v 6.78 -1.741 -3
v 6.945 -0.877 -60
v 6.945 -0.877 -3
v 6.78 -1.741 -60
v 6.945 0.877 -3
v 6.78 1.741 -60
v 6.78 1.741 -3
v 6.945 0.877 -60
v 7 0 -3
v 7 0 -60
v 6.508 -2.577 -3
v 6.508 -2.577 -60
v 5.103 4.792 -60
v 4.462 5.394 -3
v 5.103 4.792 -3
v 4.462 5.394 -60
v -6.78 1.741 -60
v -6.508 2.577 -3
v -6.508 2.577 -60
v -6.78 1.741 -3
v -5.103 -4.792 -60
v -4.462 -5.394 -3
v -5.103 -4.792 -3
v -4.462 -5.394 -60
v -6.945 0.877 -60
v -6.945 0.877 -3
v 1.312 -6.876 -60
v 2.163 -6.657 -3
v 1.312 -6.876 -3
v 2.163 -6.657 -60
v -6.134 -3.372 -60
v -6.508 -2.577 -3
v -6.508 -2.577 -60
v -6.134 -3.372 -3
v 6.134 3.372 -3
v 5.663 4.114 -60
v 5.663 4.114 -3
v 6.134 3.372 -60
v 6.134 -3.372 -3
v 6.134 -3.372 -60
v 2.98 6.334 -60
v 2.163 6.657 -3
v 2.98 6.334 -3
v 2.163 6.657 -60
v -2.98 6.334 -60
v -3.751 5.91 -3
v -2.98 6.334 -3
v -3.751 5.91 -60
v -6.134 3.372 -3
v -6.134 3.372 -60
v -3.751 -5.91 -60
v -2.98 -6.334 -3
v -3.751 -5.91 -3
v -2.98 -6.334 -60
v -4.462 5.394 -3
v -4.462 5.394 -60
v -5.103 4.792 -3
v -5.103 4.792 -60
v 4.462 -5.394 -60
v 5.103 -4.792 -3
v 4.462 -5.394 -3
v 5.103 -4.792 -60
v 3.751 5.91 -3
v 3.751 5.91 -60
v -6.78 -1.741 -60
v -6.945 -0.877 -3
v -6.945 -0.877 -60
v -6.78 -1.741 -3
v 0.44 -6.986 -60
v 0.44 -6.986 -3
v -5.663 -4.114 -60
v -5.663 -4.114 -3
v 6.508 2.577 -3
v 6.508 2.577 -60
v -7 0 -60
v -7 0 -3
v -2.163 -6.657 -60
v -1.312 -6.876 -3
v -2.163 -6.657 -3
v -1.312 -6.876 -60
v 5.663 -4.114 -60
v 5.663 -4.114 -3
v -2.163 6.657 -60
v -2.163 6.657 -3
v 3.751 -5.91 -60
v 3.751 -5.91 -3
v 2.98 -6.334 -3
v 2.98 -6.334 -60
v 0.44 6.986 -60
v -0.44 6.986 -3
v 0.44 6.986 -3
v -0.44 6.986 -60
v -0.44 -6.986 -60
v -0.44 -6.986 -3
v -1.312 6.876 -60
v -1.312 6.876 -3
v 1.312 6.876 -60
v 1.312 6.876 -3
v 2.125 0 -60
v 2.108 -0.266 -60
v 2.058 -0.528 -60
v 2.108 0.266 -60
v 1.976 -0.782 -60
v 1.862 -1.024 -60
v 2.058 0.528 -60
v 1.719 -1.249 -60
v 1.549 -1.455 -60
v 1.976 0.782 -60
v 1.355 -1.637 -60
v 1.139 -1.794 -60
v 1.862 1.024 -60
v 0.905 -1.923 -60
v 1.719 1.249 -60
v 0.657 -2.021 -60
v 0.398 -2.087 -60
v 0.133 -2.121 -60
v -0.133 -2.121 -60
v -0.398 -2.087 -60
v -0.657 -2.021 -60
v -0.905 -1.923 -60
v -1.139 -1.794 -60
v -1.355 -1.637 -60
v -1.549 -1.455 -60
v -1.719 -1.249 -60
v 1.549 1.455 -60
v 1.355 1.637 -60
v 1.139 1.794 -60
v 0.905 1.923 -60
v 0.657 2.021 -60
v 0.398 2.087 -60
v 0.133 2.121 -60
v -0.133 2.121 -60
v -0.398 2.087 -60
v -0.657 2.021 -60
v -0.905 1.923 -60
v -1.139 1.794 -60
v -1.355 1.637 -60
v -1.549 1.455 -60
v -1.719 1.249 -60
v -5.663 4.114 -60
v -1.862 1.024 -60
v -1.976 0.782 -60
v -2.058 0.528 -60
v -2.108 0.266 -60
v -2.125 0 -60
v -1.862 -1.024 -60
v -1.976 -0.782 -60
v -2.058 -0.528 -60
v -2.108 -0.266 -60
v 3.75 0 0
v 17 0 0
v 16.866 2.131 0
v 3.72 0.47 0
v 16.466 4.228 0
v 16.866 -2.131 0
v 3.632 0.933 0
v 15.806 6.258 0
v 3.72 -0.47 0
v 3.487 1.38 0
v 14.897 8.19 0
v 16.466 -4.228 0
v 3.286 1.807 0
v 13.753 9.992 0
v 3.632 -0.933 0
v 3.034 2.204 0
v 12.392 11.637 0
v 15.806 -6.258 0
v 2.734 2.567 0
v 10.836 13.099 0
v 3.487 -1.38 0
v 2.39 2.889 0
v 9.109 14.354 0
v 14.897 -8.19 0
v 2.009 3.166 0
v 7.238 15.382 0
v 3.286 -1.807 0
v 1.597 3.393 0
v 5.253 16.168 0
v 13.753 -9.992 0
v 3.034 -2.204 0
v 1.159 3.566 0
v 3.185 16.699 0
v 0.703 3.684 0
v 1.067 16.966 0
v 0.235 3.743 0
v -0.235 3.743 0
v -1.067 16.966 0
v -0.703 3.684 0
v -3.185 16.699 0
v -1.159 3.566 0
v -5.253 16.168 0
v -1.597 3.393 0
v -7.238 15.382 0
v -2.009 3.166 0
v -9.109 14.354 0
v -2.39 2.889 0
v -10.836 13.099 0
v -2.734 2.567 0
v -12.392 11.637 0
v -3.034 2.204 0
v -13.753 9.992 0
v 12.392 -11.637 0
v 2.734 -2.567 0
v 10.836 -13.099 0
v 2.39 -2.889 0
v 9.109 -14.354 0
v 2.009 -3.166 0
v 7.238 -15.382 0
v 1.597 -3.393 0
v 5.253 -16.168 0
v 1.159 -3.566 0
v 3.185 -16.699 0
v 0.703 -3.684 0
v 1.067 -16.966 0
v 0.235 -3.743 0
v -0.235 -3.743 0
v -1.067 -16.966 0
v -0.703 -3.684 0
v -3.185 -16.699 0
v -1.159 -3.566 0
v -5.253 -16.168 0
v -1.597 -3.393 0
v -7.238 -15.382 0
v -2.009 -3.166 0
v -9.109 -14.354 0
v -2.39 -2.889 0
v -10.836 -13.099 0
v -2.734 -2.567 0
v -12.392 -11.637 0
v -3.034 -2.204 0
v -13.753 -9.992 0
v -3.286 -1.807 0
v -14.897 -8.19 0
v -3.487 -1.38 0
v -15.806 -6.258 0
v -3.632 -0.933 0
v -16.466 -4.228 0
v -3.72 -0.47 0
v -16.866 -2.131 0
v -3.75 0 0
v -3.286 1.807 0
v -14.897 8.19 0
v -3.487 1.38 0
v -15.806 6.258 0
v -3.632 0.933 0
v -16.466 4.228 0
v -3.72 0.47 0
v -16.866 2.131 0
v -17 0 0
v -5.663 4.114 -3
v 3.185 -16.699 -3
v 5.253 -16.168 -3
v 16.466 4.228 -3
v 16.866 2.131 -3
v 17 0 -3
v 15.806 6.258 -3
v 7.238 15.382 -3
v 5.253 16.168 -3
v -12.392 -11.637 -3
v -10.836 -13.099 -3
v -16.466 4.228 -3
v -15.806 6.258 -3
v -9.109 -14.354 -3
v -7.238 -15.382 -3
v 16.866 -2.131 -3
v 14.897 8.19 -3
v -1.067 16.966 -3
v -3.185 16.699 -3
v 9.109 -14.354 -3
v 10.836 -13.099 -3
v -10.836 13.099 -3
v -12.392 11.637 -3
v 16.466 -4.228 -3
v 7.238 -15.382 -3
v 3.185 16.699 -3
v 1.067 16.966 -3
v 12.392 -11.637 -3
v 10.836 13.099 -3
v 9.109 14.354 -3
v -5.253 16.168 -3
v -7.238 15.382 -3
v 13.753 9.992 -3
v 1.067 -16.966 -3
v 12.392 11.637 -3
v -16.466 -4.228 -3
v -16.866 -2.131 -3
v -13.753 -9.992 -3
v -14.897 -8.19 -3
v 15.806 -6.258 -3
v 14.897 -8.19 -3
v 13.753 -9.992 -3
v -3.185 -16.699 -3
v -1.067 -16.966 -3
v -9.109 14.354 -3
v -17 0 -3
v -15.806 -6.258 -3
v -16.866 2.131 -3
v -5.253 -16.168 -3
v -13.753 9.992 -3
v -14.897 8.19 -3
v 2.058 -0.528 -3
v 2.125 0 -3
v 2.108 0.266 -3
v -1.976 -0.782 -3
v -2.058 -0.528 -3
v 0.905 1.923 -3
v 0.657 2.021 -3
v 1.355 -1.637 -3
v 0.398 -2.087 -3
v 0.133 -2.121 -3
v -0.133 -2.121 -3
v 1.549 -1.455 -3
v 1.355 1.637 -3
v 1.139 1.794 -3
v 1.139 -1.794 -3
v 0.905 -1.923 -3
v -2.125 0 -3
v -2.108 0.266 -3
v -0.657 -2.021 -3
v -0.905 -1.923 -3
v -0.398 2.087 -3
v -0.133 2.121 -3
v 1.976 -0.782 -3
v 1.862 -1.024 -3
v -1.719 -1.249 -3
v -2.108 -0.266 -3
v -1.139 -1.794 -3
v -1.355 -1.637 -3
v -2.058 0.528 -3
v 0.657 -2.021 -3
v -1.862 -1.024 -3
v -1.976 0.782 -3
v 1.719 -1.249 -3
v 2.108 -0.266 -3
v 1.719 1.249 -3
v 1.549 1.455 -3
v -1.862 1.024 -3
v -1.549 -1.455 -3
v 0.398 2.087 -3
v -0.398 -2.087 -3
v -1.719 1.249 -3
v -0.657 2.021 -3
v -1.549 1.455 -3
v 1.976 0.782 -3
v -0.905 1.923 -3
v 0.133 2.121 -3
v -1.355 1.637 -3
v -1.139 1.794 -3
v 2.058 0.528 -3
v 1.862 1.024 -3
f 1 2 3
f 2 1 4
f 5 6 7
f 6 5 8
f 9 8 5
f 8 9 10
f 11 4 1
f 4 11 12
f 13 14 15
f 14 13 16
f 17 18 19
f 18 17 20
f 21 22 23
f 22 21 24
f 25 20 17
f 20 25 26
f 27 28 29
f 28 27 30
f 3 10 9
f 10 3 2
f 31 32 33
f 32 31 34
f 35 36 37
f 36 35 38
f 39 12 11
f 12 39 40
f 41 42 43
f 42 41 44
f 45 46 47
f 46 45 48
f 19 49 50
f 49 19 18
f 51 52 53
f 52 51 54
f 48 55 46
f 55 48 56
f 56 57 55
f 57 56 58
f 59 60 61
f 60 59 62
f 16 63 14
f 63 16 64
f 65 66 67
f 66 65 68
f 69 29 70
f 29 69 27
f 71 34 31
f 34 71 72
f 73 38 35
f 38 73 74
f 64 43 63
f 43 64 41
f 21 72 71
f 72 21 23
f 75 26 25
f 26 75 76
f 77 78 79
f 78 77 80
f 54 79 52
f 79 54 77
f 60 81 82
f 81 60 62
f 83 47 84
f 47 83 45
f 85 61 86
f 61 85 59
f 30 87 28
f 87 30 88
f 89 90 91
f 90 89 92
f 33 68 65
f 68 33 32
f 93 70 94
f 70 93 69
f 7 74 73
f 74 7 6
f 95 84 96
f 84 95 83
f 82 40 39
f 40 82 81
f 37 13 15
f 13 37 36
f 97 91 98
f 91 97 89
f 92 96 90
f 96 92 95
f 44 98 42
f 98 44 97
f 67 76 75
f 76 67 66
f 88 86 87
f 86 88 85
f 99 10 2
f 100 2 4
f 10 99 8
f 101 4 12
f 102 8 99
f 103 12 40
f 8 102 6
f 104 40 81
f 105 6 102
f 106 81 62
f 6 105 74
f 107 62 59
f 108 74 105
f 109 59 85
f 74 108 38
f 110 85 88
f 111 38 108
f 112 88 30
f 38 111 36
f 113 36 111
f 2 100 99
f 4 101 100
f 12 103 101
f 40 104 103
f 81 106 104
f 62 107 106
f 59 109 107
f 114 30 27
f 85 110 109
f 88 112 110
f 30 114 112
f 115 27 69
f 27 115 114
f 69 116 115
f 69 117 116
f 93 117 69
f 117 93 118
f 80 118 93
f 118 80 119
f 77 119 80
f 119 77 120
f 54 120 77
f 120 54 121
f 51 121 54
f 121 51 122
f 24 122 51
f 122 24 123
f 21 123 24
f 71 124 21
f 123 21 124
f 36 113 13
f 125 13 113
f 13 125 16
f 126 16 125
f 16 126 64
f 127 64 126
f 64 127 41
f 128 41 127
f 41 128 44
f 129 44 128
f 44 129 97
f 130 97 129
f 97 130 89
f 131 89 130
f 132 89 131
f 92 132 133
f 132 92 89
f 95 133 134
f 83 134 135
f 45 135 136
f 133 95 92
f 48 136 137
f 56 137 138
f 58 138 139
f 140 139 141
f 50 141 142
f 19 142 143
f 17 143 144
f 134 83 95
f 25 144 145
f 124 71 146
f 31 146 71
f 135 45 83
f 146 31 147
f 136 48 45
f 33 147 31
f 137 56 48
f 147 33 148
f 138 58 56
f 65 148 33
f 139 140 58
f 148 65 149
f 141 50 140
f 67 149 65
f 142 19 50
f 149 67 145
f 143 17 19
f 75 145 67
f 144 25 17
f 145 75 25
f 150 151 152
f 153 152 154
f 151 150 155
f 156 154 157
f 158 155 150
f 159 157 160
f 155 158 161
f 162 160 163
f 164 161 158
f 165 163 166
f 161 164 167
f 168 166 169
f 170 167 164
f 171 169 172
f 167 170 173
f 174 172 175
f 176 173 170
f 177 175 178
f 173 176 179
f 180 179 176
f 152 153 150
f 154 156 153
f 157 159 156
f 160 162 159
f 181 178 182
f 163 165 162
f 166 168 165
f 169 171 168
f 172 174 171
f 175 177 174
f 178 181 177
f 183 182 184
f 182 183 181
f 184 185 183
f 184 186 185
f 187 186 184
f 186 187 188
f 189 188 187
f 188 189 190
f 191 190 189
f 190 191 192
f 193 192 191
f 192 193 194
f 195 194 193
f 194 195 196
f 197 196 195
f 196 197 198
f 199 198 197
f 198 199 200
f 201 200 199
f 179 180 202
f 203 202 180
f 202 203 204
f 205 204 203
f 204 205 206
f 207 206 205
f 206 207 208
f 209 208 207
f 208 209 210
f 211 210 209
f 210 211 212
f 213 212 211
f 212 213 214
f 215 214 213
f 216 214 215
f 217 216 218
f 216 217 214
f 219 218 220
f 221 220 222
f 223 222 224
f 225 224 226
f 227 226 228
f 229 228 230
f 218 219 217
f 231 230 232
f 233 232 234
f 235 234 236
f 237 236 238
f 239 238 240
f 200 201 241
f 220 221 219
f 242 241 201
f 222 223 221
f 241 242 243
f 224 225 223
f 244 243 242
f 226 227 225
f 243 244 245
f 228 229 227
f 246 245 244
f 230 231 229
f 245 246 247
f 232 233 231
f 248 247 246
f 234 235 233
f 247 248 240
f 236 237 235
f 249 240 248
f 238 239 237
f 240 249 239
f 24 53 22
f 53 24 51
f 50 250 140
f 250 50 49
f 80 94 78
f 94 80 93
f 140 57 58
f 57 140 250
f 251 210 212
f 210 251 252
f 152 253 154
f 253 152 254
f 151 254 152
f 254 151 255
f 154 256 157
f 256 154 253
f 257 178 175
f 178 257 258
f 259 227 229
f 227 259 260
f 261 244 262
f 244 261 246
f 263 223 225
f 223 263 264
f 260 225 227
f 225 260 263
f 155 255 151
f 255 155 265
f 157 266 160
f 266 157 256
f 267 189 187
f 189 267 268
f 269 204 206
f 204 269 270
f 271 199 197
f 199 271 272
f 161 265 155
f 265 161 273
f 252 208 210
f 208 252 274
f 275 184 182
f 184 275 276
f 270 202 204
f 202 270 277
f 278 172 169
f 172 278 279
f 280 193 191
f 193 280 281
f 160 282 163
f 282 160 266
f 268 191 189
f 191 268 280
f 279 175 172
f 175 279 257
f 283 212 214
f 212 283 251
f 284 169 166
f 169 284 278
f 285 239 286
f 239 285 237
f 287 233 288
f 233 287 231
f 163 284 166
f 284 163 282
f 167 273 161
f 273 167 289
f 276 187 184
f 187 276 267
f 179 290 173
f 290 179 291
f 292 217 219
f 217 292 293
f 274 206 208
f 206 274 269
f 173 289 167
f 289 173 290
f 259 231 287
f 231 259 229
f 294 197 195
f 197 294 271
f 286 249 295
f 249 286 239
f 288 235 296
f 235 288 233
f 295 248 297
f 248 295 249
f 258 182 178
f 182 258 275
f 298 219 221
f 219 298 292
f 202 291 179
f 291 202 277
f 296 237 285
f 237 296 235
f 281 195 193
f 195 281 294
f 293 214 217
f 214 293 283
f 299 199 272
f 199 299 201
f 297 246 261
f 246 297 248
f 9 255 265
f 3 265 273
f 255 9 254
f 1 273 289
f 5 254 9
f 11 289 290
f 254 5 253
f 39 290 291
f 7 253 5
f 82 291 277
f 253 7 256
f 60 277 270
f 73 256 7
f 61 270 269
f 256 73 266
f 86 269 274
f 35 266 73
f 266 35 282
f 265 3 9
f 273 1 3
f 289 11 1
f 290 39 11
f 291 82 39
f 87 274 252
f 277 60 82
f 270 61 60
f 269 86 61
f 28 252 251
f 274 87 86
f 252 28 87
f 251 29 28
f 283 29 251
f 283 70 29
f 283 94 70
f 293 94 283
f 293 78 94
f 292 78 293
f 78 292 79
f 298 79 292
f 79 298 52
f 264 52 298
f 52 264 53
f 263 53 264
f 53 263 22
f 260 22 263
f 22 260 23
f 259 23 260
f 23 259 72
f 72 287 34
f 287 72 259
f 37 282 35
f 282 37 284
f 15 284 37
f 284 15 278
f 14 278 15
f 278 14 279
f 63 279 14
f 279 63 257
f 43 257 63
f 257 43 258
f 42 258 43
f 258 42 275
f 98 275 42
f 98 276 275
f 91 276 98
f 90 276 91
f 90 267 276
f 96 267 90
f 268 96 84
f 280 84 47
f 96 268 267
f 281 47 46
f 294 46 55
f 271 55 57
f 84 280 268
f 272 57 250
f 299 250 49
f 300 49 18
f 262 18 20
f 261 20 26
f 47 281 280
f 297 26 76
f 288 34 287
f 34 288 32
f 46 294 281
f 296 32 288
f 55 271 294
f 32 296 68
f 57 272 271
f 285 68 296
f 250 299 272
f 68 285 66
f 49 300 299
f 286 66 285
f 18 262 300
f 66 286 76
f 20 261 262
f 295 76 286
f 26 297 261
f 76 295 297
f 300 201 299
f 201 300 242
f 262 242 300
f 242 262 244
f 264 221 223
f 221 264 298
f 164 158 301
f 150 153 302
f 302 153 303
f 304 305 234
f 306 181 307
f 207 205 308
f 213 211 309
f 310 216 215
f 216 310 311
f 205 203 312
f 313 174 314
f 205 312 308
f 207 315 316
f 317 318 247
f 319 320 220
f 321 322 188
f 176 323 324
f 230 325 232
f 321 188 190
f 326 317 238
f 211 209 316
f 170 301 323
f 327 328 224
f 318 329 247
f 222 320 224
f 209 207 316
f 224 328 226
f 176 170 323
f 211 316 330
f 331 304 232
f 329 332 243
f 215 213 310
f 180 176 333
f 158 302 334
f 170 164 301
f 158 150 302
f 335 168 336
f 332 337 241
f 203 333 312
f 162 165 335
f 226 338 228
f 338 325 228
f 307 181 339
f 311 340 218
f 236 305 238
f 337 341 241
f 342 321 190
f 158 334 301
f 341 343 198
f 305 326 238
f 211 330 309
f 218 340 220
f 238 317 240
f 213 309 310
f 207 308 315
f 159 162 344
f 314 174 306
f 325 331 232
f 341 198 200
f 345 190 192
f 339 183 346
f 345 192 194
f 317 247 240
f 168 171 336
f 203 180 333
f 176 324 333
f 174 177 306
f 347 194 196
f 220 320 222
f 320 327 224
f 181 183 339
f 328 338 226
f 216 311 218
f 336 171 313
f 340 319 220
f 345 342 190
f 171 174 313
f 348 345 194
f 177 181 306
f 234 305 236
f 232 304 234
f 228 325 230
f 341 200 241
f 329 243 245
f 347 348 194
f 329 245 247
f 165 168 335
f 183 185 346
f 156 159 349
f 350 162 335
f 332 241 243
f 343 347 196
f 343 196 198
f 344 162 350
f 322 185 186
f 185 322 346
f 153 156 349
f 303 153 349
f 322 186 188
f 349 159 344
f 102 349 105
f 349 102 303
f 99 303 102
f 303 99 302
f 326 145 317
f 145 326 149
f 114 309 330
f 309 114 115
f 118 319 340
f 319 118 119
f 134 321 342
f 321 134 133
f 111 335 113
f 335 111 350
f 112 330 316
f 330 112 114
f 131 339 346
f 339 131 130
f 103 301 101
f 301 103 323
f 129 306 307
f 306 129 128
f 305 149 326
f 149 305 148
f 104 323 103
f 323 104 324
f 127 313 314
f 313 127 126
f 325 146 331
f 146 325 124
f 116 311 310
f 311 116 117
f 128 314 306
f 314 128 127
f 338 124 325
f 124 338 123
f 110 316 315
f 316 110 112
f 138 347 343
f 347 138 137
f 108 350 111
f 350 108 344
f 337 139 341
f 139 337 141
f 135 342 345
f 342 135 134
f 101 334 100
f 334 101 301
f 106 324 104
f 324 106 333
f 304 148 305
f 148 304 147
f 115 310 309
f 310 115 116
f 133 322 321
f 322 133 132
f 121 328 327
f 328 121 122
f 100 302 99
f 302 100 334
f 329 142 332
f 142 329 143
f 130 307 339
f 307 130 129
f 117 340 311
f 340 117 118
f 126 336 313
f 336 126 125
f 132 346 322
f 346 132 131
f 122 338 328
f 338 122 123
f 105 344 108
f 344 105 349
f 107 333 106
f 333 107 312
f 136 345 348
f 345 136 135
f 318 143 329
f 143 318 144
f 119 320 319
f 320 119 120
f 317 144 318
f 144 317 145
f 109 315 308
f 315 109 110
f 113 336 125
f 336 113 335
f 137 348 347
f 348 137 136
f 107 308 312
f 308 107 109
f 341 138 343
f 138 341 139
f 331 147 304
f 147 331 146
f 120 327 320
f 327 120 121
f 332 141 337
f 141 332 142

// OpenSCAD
$fn = 50;


difference() {
	union() {
		translate(v = [0, 0, -60.0000000000]) {
			cylinder(h = 60, r = 7.0000000000);
		}
		translate(v = [0, 0, -3.0000000000]) {
			cylinder(h = 3, r = 17.0000000000);
		}
	}
	union() {
		translate(v = [0, 0, 0]) {
			rotate(a = [0, 0, 0]) {
				difference() {
					union() {
						#translate(v = [0, 0, -60.0000000000]) {
							cylinder(h = 60, r = 2.0000000000);
						}
						#translate(v = [0, 0, -3]) {
							cylinder(h = 3, r = 7.0000000000, r1 = 2.1250000000, r2 = 3.7500000000);
						}
						#translate(v = [0, 0, -60.0000000000]) {
							cylinder(h = 60, r = 2.1250000000);
						}
						#translate(v = [0, 0, -60.0000000000]) {
							cylinder(h = 60, r = 2.0000000000);
						}
					}
					union();
				}
			}
		}
	}
}
